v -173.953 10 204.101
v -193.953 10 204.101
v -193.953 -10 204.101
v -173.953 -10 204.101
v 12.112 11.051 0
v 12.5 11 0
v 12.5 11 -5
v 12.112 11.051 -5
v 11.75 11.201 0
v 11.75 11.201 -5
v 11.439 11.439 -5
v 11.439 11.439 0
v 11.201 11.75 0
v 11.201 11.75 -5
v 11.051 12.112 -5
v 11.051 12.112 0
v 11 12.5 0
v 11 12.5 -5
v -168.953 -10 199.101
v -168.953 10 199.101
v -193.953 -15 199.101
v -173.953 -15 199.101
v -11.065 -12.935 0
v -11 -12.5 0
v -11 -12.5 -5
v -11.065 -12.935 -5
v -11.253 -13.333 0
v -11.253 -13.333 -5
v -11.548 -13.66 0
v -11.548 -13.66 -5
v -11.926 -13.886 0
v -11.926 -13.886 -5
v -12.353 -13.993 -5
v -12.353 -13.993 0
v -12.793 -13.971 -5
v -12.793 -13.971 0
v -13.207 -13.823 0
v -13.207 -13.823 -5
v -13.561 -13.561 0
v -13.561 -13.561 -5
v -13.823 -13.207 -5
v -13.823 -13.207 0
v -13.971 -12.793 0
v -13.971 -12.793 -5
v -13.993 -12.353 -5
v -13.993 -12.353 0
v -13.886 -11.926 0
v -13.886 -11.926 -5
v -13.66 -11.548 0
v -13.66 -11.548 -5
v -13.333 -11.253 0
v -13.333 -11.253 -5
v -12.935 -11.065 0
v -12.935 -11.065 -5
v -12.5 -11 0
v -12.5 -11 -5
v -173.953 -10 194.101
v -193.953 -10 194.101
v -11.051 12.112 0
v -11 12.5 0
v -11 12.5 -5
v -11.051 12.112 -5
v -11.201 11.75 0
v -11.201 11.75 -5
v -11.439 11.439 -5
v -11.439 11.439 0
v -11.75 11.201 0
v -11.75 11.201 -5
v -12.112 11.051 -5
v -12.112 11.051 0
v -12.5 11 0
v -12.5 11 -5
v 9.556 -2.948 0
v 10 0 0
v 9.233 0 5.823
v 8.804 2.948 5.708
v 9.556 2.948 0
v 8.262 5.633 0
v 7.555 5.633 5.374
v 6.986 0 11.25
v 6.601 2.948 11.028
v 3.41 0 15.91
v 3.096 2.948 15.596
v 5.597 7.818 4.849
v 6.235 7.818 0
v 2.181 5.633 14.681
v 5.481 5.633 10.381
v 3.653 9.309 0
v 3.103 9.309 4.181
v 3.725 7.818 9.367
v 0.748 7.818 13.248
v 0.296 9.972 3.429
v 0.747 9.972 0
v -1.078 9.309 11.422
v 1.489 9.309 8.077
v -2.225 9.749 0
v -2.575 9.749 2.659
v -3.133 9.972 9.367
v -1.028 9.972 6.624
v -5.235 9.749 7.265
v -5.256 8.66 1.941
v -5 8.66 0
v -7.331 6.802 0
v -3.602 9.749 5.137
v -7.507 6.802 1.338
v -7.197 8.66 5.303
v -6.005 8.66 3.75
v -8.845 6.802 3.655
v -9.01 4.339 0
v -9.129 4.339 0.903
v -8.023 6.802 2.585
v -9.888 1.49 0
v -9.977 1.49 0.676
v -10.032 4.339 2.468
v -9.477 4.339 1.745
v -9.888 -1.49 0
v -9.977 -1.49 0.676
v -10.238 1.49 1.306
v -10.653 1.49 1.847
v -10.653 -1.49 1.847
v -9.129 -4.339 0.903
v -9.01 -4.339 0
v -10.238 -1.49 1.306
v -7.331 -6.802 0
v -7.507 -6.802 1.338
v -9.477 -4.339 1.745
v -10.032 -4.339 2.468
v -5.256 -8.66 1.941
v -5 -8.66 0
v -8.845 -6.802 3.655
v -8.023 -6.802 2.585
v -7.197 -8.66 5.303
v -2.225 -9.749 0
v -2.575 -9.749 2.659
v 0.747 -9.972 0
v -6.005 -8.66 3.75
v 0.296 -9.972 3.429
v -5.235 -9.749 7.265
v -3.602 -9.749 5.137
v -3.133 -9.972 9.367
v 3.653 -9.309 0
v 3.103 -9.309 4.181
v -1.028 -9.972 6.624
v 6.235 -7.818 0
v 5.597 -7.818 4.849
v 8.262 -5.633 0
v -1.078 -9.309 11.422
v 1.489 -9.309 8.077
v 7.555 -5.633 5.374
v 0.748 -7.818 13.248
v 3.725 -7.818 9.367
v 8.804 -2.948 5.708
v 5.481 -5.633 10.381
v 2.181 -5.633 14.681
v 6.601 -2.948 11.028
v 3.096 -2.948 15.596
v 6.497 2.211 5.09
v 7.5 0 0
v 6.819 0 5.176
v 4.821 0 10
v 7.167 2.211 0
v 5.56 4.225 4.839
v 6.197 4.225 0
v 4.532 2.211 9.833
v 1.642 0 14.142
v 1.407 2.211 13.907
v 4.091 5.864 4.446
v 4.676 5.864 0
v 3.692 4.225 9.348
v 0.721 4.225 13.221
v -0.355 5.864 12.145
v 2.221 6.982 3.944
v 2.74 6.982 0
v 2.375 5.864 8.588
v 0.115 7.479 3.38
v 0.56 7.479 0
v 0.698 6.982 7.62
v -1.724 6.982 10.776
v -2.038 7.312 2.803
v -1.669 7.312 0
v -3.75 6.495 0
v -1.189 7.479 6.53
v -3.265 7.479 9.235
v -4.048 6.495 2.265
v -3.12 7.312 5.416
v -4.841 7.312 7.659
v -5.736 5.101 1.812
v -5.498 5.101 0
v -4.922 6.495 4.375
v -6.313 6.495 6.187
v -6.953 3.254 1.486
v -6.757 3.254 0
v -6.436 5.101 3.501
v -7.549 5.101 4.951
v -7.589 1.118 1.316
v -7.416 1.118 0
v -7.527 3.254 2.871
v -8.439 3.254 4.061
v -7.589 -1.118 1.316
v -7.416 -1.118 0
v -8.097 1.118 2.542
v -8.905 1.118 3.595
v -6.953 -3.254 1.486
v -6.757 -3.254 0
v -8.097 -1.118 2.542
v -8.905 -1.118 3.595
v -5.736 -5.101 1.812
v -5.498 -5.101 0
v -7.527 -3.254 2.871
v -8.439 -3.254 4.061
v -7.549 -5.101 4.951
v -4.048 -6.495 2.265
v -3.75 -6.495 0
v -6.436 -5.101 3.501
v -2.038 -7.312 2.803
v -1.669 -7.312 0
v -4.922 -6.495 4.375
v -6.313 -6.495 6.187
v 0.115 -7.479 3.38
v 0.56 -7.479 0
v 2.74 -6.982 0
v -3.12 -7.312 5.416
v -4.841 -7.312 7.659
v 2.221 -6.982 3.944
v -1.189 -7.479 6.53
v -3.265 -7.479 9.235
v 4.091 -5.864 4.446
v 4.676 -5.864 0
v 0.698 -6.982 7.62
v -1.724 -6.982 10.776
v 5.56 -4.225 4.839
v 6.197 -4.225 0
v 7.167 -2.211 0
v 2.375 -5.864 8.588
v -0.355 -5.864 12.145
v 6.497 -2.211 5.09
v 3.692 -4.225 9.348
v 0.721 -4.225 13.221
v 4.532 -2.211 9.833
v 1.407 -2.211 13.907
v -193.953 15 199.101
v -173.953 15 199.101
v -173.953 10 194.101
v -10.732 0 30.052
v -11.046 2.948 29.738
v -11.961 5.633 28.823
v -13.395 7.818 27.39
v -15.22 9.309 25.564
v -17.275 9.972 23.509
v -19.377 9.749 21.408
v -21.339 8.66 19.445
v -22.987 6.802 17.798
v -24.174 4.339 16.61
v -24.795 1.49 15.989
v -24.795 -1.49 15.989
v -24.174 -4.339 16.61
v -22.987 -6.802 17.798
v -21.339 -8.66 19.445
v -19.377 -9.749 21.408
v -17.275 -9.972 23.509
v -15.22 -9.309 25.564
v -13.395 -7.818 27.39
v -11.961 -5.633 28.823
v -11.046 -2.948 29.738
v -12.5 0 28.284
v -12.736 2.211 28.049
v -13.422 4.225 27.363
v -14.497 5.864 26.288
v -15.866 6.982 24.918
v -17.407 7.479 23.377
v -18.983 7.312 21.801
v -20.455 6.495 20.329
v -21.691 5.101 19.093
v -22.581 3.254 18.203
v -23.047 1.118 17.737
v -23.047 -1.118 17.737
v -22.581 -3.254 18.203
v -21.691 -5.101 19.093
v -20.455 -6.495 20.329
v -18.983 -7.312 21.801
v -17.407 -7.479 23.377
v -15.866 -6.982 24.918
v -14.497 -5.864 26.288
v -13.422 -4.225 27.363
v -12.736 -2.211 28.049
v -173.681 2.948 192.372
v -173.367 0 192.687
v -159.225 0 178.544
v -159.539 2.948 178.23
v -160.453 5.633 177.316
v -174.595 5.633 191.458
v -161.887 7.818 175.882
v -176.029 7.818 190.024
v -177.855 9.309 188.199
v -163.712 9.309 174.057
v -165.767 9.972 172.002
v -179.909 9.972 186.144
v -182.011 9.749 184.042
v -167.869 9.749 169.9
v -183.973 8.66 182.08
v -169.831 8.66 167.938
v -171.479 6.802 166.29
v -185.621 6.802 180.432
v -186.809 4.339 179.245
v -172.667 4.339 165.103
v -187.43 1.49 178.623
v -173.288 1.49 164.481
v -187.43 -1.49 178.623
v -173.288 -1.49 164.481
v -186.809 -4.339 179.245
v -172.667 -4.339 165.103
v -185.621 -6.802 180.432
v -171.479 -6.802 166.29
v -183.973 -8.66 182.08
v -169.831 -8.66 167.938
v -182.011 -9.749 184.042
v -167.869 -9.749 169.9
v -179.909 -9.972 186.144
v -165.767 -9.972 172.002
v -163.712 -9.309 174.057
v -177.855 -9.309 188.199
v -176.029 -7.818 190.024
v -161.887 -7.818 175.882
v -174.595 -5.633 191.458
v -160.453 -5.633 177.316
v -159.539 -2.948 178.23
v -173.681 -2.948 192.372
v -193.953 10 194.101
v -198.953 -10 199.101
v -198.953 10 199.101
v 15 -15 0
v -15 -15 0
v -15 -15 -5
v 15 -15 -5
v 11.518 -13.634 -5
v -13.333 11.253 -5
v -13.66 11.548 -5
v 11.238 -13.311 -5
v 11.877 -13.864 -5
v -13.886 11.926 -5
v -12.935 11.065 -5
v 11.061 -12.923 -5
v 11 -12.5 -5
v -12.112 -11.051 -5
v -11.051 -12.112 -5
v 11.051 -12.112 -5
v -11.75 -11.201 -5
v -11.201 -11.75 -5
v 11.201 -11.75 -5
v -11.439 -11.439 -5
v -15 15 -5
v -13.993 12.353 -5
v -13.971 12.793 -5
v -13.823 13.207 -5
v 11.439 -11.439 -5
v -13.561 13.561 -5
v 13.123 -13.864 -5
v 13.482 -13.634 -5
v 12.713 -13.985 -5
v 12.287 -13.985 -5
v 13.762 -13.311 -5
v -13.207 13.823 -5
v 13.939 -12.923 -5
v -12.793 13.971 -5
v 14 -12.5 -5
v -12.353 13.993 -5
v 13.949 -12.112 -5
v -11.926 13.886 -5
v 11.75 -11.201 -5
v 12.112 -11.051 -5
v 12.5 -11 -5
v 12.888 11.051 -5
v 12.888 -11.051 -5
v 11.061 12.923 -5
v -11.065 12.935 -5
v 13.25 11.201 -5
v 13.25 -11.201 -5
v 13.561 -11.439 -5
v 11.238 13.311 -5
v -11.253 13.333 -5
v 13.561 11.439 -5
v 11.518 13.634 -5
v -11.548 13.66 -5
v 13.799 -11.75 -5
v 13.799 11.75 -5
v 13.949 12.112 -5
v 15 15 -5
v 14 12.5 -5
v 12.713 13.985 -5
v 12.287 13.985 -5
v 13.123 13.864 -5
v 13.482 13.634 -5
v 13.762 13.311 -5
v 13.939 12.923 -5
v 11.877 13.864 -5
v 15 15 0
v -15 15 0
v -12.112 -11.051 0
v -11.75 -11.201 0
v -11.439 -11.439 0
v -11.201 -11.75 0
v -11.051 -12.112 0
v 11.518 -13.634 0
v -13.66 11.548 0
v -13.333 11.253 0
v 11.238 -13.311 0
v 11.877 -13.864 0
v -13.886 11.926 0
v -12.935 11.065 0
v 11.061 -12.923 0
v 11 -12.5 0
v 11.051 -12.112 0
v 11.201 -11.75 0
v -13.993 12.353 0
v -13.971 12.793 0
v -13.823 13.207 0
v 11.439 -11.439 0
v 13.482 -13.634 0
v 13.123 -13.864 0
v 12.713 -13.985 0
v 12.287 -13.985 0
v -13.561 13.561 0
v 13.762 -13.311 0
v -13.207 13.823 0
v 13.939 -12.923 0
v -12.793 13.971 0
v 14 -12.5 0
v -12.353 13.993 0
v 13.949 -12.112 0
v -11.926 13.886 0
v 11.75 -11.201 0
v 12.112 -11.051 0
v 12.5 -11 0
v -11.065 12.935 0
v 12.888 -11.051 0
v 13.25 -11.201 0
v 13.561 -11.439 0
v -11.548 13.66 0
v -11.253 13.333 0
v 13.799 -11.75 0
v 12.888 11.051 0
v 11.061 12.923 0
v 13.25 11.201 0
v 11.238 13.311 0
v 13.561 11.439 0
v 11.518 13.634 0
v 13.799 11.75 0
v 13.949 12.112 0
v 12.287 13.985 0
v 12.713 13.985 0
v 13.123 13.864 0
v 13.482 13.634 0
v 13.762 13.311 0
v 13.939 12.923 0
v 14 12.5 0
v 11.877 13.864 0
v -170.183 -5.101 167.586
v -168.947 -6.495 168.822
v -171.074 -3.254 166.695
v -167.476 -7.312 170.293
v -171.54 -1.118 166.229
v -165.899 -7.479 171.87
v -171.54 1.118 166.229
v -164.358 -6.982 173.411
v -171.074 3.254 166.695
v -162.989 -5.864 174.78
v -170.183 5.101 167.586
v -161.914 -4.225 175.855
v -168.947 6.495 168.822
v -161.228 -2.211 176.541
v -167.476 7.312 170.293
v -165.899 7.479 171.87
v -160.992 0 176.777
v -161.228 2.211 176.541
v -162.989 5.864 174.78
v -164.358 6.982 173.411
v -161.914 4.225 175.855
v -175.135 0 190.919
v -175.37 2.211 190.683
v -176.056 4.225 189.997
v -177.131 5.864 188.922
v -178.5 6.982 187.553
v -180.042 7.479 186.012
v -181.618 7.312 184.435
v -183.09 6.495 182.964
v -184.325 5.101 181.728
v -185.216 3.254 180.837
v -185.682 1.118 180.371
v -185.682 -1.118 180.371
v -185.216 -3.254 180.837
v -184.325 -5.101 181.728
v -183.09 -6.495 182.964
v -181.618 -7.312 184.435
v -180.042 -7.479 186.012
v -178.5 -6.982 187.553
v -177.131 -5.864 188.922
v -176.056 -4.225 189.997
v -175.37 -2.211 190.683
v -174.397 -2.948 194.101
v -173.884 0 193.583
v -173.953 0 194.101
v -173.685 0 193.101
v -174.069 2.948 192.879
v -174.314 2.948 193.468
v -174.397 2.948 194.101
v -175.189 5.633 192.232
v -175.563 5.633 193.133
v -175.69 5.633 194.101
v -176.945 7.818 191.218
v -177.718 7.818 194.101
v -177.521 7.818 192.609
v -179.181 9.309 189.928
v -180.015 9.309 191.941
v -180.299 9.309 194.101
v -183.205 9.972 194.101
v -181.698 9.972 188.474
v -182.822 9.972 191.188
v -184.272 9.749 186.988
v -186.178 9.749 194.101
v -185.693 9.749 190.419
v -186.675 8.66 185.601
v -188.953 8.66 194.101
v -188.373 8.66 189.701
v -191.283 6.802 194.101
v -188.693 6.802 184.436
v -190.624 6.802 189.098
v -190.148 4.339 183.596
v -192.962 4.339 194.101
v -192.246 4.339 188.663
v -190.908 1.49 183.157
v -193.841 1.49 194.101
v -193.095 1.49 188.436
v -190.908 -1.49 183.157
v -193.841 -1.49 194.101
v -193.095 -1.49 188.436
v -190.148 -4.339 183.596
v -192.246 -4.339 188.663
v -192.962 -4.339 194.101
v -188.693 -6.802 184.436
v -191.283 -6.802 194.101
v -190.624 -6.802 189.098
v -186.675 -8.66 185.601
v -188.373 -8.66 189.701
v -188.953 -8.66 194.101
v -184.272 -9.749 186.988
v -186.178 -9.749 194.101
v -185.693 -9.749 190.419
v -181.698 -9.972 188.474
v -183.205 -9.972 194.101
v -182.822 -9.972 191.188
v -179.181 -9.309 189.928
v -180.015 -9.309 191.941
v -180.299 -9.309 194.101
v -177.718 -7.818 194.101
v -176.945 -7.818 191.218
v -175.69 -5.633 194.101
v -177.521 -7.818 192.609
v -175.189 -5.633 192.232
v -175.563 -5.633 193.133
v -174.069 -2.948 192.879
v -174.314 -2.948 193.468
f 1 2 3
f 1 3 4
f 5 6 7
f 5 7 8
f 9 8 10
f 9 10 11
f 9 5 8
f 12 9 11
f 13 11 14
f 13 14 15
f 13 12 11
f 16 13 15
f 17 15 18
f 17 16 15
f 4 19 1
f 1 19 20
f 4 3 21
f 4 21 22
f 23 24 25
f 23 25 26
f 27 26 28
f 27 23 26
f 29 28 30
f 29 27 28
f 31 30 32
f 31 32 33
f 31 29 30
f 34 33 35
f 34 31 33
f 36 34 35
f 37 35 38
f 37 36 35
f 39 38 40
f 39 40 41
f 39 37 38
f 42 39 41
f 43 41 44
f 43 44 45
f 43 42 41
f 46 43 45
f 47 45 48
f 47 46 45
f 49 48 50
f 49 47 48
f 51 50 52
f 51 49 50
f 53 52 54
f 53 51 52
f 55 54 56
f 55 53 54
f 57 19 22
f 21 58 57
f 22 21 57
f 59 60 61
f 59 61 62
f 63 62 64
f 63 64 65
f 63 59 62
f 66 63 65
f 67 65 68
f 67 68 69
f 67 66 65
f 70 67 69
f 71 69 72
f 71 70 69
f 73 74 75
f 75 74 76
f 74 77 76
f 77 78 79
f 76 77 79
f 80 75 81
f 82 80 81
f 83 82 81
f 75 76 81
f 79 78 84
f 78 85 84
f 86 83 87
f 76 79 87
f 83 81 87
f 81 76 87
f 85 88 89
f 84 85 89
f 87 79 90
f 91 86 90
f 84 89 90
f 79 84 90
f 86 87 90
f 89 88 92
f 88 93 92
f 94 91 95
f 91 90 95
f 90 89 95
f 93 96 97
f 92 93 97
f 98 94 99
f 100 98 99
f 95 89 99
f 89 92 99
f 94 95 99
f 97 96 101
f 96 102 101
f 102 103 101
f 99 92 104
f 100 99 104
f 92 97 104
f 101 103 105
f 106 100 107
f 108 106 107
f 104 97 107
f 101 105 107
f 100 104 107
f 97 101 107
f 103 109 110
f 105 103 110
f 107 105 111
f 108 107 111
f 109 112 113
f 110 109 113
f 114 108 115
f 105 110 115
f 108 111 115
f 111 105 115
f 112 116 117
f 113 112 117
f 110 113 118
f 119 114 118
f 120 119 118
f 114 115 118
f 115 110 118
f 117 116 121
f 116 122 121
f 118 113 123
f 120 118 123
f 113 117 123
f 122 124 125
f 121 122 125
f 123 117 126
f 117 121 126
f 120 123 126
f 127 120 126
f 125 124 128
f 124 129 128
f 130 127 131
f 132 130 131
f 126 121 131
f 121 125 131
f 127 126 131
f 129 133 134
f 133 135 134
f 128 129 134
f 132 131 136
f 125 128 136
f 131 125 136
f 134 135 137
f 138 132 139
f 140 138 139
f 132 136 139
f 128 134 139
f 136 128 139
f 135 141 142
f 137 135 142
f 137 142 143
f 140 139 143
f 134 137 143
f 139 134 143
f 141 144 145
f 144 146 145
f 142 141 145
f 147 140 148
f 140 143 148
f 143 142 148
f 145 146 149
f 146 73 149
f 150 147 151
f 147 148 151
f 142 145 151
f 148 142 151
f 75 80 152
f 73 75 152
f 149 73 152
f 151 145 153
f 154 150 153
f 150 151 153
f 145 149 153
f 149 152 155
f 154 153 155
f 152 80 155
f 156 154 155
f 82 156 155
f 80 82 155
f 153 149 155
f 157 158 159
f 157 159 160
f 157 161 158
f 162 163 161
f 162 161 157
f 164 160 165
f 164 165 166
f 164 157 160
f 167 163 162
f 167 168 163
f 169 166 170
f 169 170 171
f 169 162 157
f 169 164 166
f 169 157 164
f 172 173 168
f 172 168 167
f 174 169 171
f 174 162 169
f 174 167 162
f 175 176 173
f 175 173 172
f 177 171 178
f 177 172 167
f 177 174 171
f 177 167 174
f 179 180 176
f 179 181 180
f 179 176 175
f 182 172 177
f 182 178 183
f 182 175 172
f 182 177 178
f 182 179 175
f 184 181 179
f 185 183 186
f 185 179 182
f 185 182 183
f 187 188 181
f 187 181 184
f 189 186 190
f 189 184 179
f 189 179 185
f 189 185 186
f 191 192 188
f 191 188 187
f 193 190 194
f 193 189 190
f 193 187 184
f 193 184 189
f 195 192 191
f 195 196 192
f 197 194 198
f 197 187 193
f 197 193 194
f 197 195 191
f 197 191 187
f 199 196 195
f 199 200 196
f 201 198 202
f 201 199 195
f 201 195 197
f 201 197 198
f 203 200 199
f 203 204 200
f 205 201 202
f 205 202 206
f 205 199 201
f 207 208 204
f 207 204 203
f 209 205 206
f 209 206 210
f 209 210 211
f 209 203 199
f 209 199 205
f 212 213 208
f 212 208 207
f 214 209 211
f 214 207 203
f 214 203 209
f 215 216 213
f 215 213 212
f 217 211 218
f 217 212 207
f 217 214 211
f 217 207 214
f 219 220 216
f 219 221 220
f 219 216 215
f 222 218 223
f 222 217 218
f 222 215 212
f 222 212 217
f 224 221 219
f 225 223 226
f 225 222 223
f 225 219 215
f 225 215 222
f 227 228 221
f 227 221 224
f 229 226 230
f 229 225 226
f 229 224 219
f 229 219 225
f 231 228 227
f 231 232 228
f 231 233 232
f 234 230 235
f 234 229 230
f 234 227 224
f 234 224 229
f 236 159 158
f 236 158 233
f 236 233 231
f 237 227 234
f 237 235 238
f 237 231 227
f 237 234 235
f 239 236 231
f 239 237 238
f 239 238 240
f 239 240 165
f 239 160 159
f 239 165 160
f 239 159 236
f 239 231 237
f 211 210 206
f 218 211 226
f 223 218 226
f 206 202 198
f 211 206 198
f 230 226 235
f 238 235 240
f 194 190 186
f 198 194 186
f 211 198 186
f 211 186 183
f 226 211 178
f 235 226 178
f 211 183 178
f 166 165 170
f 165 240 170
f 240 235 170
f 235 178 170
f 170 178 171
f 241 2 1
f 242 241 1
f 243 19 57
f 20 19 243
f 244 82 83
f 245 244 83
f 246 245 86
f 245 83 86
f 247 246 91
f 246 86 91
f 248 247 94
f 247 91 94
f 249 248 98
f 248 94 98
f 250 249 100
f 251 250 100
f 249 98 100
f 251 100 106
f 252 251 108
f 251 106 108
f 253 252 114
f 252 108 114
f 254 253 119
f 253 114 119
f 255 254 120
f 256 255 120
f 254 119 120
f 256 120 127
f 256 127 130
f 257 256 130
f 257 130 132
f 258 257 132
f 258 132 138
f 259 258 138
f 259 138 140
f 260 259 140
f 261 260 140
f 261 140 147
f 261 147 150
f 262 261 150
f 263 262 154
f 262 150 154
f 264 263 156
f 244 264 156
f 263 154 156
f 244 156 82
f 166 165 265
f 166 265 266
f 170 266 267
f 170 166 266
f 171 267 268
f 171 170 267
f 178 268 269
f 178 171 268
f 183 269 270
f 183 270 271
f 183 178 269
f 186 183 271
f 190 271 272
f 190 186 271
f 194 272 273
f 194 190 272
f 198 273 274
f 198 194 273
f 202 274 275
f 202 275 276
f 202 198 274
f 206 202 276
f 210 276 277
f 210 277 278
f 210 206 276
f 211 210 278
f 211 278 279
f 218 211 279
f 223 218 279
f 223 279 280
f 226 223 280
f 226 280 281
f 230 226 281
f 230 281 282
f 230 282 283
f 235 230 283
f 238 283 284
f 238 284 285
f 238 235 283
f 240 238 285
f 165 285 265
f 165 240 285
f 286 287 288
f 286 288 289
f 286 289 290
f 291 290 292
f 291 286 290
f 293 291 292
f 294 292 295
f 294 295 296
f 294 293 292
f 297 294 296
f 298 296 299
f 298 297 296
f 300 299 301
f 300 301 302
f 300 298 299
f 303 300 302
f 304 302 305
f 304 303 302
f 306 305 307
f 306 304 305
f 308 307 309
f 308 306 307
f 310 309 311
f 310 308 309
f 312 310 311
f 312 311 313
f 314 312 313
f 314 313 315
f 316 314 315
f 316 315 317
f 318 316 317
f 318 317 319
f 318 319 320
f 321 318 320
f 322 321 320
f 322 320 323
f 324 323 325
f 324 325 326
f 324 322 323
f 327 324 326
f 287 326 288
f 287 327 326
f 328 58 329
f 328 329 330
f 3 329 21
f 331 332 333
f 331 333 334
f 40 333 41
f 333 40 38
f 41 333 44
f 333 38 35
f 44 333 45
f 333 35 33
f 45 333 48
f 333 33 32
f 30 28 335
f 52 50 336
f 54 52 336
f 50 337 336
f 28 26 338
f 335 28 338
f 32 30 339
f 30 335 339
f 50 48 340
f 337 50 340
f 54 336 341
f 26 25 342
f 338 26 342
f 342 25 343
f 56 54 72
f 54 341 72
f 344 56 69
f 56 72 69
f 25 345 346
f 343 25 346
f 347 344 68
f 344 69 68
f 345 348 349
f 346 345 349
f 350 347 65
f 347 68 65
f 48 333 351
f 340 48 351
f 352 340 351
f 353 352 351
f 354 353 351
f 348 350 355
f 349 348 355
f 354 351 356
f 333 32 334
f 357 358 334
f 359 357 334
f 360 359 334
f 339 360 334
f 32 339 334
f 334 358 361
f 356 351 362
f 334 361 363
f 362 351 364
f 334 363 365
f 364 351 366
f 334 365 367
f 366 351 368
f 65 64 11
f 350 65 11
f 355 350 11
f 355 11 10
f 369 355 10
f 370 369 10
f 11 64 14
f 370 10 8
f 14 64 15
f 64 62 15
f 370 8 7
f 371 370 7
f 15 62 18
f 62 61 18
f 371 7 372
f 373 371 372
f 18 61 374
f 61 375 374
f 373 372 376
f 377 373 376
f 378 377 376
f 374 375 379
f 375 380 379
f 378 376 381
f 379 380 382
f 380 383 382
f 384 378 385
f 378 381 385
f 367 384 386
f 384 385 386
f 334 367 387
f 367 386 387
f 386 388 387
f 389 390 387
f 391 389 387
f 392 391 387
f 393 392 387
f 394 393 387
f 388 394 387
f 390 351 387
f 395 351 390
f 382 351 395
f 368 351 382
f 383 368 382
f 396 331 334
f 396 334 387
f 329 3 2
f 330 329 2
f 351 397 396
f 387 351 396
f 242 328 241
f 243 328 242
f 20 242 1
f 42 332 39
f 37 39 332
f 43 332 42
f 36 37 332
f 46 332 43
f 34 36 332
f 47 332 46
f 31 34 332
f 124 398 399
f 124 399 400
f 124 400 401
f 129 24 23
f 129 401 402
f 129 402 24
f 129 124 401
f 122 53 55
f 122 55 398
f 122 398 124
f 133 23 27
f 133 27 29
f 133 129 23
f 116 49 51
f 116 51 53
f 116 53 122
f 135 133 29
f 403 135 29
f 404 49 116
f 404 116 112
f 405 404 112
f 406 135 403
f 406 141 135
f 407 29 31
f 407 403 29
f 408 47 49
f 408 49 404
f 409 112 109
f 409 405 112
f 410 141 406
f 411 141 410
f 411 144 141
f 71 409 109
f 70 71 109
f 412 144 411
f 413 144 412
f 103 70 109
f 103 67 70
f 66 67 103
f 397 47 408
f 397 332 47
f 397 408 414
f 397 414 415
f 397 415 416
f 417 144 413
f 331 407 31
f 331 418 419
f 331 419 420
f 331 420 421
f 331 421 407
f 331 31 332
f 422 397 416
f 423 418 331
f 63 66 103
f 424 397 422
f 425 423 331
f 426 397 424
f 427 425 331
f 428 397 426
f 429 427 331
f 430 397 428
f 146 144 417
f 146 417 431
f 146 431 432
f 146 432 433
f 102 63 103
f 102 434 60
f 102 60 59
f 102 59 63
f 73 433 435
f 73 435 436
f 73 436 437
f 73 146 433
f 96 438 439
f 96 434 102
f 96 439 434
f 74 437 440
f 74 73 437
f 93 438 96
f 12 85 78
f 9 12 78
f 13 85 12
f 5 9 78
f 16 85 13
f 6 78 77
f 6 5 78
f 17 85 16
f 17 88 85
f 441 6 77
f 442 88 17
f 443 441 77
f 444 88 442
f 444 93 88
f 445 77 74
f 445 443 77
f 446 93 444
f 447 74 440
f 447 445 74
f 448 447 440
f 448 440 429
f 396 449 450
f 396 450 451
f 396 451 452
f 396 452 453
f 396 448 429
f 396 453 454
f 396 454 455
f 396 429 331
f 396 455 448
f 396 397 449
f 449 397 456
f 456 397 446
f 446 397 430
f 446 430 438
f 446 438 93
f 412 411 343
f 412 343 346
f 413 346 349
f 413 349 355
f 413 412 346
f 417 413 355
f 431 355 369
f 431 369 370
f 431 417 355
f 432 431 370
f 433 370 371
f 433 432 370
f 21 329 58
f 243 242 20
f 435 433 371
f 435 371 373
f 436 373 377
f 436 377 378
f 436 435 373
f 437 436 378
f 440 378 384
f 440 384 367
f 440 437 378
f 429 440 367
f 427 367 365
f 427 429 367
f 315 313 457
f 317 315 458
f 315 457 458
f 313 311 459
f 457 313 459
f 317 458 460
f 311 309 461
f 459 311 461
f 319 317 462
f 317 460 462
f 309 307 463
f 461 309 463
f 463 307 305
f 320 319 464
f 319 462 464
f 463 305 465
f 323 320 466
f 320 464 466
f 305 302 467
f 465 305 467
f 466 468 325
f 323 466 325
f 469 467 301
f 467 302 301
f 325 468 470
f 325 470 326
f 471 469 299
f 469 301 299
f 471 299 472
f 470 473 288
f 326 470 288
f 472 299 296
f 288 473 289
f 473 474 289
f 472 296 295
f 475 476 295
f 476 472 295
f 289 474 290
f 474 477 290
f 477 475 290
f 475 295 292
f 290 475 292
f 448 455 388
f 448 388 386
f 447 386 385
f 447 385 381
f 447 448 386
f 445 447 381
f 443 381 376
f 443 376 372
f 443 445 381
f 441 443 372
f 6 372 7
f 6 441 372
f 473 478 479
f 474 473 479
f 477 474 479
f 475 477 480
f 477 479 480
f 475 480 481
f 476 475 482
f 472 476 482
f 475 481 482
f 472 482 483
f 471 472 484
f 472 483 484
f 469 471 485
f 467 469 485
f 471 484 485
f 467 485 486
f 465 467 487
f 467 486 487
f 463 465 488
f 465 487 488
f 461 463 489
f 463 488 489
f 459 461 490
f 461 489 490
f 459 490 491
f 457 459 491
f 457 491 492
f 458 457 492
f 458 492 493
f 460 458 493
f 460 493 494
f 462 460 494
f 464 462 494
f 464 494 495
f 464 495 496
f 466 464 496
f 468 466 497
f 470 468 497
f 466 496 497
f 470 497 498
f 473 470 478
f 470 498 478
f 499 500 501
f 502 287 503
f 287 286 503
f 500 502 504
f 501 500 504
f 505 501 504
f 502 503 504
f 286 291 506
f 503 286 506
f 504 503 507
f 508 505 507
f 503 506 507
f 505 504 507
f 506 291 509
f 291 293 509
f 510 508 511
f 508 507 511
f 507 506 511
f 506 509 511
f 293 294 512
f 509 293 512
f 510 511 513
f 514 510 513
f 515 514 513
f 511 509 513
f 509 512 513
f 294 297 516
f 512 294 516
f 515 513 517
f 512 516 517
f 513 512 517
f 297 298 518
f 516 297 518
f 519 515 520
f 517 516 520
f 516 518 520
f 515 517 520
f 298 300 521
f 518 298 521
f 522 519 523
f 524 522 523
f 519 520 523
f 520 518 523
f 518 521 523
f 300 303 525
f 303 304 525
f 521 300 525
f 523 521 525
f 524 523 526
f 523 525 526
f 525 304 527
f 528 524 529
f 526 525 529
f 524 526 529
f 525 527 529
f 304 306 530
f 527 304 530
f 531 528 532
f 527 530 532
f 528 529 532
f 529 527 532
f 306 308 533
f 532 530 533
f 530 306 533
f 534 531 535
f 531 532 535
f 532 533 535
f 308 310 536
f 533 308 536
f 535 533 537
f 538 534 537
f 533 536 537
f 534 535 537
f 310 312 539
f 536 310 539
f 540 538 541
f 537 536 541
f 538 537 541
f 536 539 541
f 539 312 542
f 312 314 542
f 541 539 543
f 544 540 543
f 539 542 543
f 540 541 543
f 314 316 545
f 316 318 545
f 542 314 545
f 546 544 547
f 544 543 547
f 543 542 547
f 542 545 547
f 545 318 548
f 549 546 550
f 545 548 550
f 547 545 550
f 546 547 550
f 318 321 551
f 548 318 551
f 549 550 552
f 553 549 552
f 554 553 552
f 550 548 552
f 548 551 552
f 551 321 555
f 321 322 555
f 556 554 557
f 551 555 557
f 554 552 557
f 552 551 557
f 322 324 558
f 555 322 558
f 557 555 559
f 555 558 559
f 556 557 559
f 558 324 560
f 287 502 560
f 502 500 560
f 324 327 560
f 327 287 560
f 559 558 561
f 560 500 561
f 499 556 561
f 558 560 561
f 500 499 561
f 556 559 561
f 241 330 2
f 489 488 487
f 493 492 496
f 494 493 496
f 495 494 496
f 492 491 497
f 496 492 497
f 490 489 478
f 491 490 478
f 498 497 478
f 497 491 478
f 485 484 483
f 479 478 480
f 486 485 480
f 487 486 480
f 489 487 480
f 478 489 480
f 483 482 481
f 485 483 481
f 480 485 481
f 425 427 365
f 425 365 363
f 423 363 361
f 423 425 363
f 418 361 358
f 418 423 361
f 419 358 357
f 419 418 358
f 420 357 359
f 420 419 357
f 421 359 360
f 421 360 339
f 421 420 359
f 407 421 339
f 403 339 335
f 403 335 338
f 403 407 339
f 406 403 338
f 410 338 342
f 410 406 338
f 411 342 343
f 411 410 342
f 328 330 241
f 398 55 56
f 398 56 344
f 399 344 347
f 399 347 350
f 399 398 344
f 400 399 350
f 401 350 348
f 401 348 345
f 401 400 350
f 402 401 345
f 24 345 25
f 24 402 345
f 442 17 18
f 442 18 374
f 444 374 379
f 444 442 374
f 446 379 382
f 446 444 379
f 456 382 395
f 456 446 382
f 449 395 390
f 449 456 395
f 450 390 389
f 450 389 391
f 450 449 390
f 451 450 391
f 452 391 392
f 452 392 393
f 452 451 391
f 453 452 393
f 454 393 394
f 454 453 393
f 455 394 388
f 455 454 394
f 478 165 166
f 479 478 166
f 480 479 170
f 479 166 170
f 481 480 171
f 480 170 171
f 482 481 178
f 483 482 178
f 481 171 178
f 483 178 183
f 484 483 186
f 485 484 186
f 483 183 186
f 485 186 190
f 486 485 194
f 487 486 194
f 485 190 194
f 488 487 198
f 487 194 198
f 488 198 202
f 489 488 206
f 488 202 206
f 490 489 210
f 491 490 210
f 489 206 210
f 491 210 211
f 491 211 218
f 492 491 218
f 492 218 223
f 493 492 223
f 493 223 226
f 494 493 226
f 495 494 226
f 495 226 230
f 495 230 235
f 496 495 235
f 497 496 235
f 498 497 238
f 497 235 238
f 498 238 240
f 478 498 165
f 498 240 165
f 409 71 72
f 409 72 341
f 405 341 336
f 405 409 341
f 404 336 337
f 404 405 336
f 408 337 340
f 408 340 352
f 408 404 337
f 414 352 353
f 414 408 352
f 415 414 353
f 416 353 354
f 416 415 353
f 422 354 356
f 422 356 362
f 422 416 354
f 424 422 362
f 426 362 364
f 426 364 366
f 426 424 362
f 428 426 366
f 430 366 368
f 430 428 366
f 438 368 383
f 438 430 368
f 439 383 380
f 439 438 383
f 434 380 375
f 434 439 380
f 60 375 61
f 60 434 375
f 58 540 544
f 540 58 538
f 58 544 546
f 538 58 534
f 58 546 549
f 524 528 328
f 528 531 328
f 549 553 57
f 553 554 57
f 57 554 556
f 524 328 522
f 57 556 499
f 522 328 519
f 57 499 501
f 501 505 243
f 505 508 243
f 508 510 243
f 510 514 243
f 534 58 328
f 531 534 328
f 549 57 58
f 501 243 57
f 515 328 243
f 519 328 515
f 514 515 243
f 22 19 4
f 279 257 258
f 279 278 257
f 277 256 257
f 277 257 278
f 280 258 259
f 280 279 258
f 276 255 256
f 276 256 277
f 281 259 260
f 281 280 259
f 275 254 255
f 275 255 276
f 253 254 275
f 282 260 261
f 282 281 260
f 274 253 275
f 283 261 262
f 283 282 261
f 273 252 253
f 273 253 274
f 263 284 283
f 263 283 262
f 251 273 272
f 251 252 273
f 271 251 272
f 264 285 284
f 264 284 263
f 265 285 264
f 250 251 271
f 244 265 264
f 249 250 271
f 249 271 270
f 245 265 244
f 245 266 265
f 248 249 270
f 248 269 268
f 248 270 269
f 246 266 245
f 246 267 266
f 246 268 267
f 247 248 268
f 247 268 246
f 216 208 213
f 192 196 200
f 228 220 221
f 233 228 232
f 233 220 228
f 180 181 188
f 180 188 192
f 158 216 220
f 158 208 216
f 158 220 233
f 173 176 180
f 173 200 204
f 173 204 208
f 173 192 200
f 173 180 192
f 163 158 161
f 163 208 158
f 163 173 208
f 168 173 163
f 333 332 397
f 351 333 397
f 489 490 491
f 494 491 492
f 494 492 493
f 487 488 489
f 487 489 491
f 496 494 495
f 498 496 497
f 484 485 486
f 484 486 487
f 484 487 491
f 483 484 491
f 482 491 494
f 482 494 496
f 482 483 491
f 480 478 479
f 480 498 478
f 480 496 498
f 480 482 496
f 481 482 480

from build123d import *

# Parameters (mm, degrees)
F0_W      = 30
F0_H      = 30
F0_R      = 10
F0_R_2    = 7.5
F1_DEPTH  = 5
F2_ANGLE  = 45
F4_DEPTH  = 20
F3_R      = 7.5
F5_DEPTH  = 250
F6_R      = 10
F6_R_2    = 7.5
F7_ANGLE  = 45
F8_DEPTH  = 20
F9_W      = 30
F9_H      = 30
F9_R      = 10
F10_DEPTH = 10
F11_SIZE  = 4.99999


# Not quite as in the source:
# - a fillet or chamfer is up to 0.001 mm smaller than in the source, because OpenCascade refuses the exact size


with BuildPart() as f1:
    # F0 (on Top) → F1 (new body)
    with BuildSketch(Plane.XY):
        Rectangle(F0_W, F0_H)
        with BuildLine():
            Line((11, -12.5), (-11, -12.5))
            ThreePointArc((-11, -12.5), (-13.5606601718, -13.5606601718), (-12.5, -11))
            Line((-12.5, -11), (-12.5, 11))
            ThreePointArc((-12.5, 11), (-13.5606601718, 13.5606601718), (-11, 12.5))
            Line((-11, 12.5), (11, 12.5))
            ThreePointArc((11, 12.5), (12.5, 14), (14, 12.5))
            ThreePointArc((14, 12.5), (13.5606601718, 11.4393398282), (12.5, 11))
            Line((12.5, 11), (12.5, -11))
            ThreePointArc((12.5, -11), (13.5606601718, -11.4393398282), (14, -12.5))
            ThreePointArc((14, -12.5), (12.5, -14), (11, -12.5))
        make_face(mode=Mode.SUBTRACT)
        with BuildLine():
            ThreePointArc((-12.5, -11), (-11.4393398282, -11.4393398282), (-11, -12.5))
            Line((-11, -12.5), (11, -12.5))
            ThreePointArc((11, -12.5), (11.4393398282, -11.4393398282), (12.5, -11))
            Line((12.5, -11), (12.5, 11))
            ThreePointArc((12.5, 11), (11.4393398282, 11.4393398282), (11, 12.5))
            Line((11, 12.5), (-11, 12.5))
            ThreePointArc((-11, 12.5), (-11.4393398282, 11.4393398282), (-12.5, 11))
            Line((-12.5, 11), (-12.5, -11))
        make_face()
        Circle(F0_R, mode=Mode.SUBTRACT)
        Circle(F0_R)
        Circle(F0_R_2, mode=Mode.SUBTRACT)
        Circle(F0_R_2)
    extrude(amount=-F1_DEPTH)

    # F0 (on Top) → F2 (revolve)
    with BuildSketch(Plane.XY):
        Circle(F0_R)
        Circle(F0_R_2, mode=Mode.SUBTRACT)
    revolve(axis=Axis((-12.5, 0, 0), (0, -1, 0)), revolution_arc=F2_ANGLE)

    # F4 (add): a face of the model
    f4_faces = [f1.faces().sort_by_distance(p)[0] for p in [
        (-10.532233047, 0, 1.967766953),
    ]]
    extrude(f4_faces, amount=F4_DEPTH)


with BuildPart() as f5:
    # F3 (on face) → F5 (new body)
    with BuildSketch(Plane(origin=(-6.25, 0, 6.25), x_dir=(0.7071067812, 0, 0.7071067812), z_dir=(-0.7071067812, 0, 0.7071067812))):
        with Locations((3.6611652352, 0)):
            Circle(F3_R)
    extrude(amount=F5_DEPTH)


with BuildPart() as f7:
    # F6 (on face) → F7 (revolve)
    with BuildSketch(Plane(origin=(-183.0266952966, 0, 183.0266952966), x_dir=(0.7071067812, 0, 0.7071067812), z_dir=(-0.7071067812, 0, 0.7071067812))):
        with Locations((3.6611652352, 0)):
            Circle(F6_R)
        with Locations((3.6611652352, 0)):
            Circle(F6_R_2, mode=Mode.SUBTRACT)
        with Locations((3.6611652352, 0)):
            Circle(F6_R_2)
    revolve(axis=Axis((-171.9525791576, -0.2738032596, 194.1008114357), (0, 1, 0)), revolution_arc=F7_ANGLE)

    # F6 (on face) → F8 (join)
    with BuildSketch(Plane(origin=(-183.0266952966, 0, 183.0266952966), x_dir=(0.7071067812, 0, 0.7071067812), z_dir=(-0.7071067812, 0, 0.7071067812))):
        with Locations((3.6611652352, 0)):
            Circle(F6_R)
        with Locations((3.6611652352, 0)):
            Circle(F6_R_2, mode=Mode.SUBTRACT)
    extrude(amount=-F8_DEPTH)

    # F9 (on face) → F10 (join)
    with BuildSketch(Plane.XY.offset(194.1008114357)):
        with Locations((-183.9525791576, 0)):
            Rectangle(F9_W, F9_H)
        with Locations((-183.9525791576, 0)):
            Circle(F9_R, mode=Mode.SUBTRACT)
        with Locations((-183.9525791576, 0)):
            Circle(F9_R)
    extrude(amount=F10_DEPTH)

    # F11 (size 5 in the source; OpenCascade refuses exactly that, so slightly less here)
    f11_edges = [f7.edges().sort_by_distance(p)[0] for p in [
        (-198.952579, 15, 199.100811),
        (-198.952579, -15, 199.100811),
        (-198.952579, 0, 194.100811),
        (-198.952579, 0, 204.100811),
        (-168.952579, 15, 199.100811),
        (-183.952579, 15, 194.100811),
        (-183.952579, 15, 204.100811),
        (-168.952579, -15, 199.100811),
        (-168.952579, 0, 194.100811),
        (-168.952579, 0, 204.100811),
        (-183.952579, -15, 194.100811),
        (-183.952579, -15, 204.100811),
    ]]
    chamfer(f11_edges, length=F11_SIZE)


solid = Compound([f1.part, f5.part, f7.part])
